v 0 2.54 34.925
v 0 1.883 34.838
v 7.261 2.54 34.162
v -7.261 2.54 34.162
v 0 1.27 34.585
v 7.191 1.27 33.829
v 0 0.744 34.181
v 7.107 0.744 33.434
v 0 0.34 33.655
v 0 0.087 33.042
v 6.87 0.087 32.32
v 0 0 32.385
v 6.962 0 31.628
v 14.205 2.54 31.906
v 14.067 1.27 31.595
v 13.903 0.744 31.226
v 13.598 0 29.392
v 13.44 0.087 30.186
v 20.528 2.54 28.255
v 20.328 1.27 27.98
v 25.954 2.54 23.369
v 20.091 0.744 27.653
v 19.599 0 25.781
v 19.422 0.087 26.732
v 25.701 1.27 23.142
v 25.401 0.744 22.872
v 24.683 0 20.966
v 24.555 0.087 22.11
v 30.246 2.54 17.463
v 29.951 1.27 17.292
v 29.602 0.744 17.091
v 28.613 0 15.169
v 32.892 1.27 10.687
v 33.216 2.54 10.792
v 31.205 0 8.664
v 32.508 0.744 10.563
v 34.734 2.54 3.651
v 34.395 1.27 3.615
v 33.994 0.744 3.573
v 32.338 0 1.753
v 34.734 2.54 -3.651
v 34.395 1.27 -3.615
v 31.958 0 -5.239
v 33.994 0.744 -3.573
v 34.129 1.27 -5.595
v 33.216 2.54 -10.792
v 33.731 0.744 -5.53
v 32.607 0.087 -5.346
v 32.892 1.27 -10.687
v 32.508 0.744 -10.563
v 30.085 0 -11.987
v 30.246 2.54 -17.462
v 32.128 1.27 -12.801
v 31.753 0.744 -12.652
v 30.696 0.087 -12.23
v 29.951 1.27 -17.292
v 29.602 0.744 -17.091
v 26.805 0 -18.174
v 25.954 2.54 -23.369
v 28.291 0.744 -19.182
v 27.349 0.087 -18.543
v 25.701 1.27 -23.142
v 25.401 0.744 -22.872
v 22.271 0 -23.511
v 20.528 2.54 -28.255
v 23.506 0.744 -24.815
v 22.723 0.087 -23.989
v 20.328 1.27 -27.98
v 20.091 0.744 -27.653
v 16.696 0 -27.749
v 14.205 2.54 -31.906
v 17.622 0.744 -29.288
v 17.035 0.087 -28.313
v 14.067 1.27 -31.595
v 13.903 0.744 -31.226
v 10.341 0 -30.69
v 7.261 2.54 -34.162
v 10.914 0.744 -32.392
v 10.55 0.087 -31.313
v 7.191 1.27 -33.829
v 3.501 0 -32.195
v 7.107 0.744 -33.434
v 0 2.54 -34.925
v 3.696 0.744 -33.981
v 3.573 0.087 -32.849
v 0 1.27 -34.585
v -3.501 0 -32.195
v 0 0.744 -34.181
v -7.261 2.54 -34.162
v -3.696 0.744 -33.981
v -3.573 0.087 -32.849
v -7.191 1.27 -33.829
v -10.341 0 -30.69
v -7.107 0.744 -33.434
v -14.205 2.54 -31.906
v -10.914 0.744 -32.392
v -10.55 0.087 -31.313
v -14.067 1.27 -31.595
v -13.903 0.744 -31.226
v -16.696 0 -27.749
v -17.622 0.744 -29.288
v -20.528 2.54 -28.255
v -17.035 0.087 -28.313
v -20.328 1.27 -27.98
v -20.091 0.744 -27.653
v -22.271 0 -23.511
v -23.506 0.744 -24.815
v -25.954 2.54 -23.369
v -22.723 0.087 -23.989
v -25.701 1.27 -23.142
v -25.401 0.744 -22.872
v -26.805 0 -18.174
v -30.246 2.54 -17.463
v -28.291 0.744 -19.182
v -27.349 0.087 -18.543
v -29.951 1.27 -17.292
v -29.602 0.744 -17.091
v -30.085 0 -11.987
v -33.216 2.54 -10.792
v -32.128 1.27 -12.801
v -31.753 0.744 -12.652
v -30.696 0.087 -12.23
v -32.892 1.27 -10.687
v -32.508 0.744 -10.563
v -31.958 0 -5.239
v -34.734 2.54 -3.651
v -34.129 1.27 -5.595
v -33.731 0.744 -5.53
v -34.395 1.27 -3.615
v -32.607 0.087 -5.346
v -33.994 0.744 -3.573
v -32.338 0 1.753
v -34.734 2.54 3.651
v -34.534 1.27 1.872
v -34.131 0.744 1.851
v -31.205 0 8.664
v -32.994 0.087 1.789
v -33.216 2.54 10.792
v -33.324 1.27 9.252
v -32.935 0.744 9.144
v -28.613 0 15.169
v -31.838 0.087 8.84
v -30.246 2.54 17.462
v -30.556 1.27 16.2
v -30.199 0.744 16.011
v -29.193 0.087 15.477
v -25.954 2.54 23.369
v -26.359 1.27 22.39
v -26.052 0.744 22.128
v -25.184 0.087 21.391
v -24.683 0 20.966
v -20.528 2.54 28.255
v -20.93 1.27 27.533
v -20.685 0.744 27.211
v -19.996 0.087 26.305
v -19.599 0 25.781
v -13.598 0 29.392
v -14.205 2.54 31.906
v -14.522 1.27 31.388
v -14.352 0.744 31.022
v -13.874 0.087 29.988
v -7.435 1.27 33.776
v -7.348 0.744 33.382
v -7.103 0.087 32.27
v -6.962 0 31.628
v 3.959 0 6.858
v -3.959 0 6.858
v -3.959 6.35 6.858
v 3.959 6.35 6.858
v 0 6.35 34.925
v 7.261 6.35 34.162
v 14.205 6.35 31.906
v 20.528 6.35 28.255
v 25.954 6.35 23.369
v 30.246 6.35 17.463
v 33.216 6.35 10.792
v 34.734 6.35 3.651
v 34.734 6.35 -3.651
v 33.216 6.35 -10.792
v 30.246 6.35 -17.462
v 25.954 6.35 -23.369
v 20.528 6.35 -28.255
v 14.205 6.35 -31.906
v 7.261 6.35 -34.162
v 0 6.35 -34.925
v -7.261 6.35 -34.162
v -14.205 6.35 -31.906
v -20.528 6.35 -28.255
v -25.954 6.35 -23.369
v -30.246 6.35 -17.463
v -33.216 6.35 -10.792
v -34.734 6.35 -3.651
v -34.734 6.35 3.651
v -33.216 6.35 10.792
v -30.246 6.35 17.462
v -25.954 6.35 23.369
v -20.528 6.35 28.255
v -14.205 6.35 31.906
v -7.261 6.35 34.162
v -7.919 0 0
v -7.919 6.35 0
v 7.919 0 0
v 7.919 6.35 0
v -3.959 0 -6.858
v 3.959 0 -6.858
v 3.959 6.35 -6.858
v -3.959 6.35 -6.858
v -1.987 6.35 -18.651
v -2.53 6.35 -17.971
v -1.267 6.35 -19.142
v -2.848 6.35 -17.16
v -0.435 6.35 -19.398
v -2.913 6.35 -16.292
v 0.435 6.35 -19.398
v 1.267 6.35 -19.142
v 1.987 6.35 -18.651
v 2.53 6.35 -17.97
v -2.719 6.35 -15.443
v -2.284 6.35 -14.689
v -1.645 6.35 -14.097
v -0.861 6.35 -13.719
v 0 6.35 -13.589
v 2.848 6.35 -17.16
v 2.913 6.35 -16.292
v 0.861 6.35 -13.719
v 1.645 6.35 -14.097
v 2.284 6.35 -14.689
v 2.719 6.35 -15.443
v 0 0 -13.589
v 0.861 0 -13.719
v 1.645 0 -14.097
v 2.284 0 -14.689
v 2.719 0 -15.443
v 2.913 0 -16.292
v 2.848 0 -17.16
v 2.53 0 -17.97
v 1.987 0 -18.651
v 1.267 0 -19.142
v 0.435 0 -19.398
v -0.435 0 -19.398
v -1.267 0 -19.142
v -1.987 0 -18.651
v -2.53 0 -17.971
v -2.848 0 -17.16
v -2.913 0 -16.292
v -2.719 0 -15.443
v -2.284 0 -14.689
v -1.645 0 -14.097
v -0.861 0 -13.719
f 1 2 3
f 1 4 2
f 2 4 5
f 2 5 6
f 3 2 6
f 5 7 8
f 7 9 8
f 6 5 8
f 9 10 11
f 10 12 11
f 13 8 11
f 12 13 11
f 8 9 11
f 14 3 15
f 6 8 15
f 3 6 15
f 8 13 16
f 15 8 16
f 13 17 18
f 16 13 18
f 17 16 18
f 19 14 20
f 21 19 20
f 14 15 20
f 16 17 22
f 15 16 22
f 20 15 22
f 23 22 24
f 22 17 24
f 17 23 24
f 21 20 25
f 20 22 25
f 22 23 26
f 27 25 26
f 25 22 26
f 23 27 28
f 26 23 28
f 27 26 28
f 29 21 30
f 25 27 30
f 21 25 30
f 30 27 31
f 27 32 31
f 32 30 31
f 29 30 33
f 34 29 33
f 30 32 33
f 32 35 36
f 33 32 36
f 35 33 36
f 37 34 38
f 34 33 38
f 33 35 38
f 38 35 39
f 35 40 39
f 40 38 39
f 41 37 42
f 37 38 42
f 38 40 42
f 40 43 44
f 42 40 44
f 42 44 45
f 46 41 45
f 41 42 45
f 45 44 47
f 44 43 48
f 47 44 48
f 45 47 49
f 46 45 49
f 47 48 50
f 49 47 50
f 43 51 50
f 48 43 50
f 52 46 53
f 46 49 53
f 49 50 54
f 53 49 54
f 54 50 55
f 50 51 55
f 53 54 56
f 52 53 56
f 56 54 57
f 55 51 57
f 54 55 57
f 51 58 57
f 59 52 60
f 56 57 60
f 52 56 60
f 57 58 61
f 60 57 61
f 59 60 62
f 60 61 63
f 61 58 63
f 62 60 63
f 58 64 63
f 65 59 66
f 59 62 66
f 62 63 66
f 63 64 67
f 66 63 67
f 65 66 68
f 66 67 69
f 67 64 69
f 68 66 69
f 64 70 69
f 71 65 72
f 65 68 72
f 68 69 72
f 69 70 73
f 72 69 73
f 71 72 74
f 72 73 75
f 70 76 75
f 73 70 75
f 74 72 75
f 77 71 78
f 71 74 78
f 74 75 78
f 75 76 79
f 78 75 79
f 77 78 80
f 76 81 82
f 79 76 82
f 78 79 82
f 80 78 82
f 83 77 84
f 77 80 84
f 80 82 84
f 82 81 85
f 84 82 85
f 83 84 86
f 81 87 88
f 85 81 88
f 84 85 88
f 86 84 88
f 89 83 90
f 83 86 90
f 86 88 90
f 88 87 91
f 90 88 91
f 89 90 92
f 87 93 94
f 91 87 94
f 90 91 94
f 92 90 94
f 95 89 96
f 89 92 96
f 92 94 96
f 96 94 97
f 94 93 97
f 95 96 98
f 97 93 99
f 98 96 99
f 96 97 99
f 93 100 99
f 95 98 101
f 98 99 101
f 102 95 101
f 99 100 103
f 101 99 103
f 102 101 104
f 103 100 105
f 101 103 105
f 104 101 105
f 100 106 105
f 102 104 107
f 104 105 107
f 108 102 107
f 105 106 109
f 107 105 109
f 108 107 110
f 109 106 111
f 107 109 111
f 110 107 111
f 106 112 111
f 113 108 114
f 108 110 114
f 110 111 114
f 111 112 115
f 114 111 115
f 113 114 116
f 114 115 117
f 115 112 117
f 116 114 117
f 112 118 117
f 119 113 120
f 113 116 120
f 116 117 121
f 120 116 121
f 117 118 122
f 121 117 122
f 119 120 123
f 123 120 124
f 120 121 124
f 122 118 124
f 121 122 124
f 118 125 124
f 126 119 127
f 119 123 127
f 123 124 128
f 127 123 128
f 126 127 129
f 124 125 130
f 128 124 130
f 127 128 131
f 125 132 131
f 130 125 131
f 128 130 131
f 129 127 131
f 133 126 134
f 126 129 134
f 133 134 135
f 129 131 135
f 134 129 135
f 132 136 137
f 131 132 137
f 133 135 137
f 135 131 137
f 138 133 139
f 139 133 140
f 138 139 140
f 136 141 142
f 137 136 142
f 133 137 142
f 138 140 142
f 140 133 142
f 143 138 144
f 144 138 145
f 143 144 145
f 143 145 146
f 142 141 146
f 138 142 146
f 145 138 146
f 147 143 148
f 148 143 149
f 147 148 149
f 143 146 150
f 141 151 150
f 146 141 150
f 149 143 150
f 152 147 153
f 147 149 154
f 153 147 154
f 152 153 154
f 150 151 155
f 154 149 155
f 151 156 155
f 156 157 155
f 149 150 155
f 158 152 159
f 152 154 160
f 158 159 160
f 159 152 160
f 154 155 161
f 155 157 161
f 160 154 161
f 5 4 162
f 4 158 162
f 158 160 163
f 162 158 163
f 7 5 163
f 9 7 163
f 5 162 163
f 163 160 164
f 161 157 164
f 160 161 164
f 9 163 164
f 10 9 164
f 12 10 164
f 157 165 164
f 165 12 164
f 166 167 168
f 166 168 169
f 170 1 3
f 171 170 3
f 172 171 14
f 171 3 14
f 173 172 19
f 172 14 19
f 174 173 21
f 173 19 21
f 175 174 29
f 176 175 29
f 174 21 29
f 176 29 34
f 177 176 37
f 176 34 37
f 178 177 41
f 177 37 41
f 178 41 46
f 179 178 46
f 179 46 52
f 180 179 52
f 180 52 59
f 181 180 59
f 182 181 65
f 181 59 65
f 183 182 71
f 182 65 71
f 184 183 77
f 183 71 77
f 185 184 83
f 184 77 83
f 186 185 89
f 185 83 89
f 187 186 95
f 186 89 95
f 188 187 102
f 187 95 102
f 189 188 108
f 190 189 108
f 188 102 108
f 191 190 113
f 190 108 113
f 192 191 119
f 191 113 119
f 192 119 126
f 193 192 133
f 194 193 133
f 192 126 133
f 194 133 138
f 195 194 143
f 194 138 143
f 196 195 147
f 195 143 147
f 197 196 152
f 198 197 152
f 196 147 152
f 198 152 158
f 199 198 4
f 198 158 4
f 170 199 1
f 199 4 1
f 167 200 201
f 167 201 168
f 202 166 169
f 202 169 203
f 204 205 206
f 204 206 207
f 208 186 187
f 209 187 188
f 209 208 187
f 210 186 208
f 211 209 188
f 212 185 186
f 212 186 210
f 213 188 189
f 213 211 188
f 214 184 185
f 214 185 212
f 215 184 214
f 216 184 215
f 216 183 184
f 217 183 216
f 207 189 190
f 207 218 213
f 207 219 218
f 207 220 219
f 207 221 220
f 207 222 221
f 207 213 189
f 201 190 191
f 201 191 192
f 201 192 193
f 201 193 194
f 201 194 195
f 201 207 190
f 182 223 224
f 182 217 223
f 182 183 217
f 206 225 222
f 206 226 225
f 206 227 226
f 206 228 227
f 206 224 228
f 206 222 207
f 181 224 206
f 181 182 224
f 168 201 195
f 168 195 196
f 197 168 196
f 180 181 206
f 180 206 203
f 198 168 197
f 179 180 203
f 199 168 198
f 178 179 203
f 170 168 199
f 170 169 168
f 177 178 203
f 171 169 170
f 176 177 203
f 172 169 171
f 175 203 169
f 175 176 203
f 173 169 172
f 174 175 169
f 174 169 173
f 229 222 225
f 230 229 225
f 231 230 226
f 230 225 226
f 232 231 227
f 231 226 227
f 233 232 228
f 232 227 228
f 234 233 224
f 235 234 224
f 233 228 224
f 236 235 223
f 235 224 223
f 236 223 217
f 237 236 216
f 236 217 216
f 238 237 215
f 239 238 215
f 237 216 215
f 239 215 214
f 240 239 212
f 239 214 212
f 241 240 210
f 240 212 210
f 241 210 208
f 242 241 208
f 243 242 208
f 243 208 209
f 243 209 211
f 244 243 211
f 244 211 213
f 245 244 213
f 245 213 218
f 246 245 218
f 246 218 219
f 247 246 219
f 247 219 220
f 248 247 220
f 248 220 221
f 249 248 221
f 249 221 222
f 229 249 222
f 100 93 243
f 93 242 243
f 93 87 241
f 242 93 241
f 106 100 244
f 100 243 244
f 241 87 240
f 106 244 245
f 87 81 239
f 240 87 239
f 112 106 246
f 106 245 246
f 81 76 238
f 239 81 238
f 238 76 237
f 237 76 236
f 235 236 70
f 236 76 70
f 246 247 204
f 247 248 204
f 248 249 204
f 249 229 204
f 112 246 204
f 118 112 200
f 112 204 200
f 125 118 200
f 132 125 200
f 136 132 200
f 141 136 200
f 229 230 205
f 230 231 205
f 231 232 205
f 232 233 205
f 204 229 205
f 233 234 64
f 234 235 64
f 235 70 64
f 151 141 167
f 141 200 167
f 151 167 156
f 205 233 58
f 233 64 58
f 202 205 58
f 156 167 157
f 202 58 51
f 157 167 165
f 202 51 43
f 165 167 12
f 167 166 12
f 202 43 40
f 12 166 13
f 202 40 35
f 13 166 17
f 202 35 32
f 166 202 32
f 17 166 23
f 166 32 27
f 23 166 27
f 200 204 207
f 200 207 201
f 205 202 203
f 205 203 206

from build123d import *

# Parameters (mm, degrees)
SKETCH1_R           = 34.925
BOSS_EXTRUDE1_DEPTH = 6.35
FILLET1_R           = 2.54
SKETCH2_R           = 2.921
CUT_EXTRUDE1_DEPTH  = 50.797929174


with BuildPart() as part:
    # Sketch1 → Boss-Extrude1 (new body)
    with BuildSketch(Plane(origin=(0, 0, 0), x_dir=(1, 0, 0), z_dir=(0, 1, 0))):
        with Locations(Location((0, 0, 0), (0, 0, 270))):
            Circle(SKETCH1_R)
        Polygon((7.918936292, 0), (3.959468146, 6.858), (-3.959468146, 6.858), (-7.918936292, 0), (-3.959468146, -6.858), (3.959468146, -6.858), align=None, mode=Mode.SUBTRACT)
    extrude(amount=BOSS_EXTRUDE1_DEPTH)

    # Fillet1
    fillet1_edges = [part.edges().sort_by_distance(p)[0] for p in [
        (0, 0, -34.925),
    ]]
    fillet(fillet1_edges, radius=FILLET1_R)

    # Sketch2 → Cut-Extrude1 (cut, through all)
    with BuildSketch(Plane(origin=(0, 6.35, 0), x_dir=(1, 0, 0), z_dir=(0, 1, 0))):
        with Locations(Location((0, 16.51, 0), (0, 0, 270))):
            Circle(SKETCH2_R)
    extrude(amount=-CUT_EXTRUDE1_DEPTH, mode=Mode.SUBTRACT)


solid = part.part
